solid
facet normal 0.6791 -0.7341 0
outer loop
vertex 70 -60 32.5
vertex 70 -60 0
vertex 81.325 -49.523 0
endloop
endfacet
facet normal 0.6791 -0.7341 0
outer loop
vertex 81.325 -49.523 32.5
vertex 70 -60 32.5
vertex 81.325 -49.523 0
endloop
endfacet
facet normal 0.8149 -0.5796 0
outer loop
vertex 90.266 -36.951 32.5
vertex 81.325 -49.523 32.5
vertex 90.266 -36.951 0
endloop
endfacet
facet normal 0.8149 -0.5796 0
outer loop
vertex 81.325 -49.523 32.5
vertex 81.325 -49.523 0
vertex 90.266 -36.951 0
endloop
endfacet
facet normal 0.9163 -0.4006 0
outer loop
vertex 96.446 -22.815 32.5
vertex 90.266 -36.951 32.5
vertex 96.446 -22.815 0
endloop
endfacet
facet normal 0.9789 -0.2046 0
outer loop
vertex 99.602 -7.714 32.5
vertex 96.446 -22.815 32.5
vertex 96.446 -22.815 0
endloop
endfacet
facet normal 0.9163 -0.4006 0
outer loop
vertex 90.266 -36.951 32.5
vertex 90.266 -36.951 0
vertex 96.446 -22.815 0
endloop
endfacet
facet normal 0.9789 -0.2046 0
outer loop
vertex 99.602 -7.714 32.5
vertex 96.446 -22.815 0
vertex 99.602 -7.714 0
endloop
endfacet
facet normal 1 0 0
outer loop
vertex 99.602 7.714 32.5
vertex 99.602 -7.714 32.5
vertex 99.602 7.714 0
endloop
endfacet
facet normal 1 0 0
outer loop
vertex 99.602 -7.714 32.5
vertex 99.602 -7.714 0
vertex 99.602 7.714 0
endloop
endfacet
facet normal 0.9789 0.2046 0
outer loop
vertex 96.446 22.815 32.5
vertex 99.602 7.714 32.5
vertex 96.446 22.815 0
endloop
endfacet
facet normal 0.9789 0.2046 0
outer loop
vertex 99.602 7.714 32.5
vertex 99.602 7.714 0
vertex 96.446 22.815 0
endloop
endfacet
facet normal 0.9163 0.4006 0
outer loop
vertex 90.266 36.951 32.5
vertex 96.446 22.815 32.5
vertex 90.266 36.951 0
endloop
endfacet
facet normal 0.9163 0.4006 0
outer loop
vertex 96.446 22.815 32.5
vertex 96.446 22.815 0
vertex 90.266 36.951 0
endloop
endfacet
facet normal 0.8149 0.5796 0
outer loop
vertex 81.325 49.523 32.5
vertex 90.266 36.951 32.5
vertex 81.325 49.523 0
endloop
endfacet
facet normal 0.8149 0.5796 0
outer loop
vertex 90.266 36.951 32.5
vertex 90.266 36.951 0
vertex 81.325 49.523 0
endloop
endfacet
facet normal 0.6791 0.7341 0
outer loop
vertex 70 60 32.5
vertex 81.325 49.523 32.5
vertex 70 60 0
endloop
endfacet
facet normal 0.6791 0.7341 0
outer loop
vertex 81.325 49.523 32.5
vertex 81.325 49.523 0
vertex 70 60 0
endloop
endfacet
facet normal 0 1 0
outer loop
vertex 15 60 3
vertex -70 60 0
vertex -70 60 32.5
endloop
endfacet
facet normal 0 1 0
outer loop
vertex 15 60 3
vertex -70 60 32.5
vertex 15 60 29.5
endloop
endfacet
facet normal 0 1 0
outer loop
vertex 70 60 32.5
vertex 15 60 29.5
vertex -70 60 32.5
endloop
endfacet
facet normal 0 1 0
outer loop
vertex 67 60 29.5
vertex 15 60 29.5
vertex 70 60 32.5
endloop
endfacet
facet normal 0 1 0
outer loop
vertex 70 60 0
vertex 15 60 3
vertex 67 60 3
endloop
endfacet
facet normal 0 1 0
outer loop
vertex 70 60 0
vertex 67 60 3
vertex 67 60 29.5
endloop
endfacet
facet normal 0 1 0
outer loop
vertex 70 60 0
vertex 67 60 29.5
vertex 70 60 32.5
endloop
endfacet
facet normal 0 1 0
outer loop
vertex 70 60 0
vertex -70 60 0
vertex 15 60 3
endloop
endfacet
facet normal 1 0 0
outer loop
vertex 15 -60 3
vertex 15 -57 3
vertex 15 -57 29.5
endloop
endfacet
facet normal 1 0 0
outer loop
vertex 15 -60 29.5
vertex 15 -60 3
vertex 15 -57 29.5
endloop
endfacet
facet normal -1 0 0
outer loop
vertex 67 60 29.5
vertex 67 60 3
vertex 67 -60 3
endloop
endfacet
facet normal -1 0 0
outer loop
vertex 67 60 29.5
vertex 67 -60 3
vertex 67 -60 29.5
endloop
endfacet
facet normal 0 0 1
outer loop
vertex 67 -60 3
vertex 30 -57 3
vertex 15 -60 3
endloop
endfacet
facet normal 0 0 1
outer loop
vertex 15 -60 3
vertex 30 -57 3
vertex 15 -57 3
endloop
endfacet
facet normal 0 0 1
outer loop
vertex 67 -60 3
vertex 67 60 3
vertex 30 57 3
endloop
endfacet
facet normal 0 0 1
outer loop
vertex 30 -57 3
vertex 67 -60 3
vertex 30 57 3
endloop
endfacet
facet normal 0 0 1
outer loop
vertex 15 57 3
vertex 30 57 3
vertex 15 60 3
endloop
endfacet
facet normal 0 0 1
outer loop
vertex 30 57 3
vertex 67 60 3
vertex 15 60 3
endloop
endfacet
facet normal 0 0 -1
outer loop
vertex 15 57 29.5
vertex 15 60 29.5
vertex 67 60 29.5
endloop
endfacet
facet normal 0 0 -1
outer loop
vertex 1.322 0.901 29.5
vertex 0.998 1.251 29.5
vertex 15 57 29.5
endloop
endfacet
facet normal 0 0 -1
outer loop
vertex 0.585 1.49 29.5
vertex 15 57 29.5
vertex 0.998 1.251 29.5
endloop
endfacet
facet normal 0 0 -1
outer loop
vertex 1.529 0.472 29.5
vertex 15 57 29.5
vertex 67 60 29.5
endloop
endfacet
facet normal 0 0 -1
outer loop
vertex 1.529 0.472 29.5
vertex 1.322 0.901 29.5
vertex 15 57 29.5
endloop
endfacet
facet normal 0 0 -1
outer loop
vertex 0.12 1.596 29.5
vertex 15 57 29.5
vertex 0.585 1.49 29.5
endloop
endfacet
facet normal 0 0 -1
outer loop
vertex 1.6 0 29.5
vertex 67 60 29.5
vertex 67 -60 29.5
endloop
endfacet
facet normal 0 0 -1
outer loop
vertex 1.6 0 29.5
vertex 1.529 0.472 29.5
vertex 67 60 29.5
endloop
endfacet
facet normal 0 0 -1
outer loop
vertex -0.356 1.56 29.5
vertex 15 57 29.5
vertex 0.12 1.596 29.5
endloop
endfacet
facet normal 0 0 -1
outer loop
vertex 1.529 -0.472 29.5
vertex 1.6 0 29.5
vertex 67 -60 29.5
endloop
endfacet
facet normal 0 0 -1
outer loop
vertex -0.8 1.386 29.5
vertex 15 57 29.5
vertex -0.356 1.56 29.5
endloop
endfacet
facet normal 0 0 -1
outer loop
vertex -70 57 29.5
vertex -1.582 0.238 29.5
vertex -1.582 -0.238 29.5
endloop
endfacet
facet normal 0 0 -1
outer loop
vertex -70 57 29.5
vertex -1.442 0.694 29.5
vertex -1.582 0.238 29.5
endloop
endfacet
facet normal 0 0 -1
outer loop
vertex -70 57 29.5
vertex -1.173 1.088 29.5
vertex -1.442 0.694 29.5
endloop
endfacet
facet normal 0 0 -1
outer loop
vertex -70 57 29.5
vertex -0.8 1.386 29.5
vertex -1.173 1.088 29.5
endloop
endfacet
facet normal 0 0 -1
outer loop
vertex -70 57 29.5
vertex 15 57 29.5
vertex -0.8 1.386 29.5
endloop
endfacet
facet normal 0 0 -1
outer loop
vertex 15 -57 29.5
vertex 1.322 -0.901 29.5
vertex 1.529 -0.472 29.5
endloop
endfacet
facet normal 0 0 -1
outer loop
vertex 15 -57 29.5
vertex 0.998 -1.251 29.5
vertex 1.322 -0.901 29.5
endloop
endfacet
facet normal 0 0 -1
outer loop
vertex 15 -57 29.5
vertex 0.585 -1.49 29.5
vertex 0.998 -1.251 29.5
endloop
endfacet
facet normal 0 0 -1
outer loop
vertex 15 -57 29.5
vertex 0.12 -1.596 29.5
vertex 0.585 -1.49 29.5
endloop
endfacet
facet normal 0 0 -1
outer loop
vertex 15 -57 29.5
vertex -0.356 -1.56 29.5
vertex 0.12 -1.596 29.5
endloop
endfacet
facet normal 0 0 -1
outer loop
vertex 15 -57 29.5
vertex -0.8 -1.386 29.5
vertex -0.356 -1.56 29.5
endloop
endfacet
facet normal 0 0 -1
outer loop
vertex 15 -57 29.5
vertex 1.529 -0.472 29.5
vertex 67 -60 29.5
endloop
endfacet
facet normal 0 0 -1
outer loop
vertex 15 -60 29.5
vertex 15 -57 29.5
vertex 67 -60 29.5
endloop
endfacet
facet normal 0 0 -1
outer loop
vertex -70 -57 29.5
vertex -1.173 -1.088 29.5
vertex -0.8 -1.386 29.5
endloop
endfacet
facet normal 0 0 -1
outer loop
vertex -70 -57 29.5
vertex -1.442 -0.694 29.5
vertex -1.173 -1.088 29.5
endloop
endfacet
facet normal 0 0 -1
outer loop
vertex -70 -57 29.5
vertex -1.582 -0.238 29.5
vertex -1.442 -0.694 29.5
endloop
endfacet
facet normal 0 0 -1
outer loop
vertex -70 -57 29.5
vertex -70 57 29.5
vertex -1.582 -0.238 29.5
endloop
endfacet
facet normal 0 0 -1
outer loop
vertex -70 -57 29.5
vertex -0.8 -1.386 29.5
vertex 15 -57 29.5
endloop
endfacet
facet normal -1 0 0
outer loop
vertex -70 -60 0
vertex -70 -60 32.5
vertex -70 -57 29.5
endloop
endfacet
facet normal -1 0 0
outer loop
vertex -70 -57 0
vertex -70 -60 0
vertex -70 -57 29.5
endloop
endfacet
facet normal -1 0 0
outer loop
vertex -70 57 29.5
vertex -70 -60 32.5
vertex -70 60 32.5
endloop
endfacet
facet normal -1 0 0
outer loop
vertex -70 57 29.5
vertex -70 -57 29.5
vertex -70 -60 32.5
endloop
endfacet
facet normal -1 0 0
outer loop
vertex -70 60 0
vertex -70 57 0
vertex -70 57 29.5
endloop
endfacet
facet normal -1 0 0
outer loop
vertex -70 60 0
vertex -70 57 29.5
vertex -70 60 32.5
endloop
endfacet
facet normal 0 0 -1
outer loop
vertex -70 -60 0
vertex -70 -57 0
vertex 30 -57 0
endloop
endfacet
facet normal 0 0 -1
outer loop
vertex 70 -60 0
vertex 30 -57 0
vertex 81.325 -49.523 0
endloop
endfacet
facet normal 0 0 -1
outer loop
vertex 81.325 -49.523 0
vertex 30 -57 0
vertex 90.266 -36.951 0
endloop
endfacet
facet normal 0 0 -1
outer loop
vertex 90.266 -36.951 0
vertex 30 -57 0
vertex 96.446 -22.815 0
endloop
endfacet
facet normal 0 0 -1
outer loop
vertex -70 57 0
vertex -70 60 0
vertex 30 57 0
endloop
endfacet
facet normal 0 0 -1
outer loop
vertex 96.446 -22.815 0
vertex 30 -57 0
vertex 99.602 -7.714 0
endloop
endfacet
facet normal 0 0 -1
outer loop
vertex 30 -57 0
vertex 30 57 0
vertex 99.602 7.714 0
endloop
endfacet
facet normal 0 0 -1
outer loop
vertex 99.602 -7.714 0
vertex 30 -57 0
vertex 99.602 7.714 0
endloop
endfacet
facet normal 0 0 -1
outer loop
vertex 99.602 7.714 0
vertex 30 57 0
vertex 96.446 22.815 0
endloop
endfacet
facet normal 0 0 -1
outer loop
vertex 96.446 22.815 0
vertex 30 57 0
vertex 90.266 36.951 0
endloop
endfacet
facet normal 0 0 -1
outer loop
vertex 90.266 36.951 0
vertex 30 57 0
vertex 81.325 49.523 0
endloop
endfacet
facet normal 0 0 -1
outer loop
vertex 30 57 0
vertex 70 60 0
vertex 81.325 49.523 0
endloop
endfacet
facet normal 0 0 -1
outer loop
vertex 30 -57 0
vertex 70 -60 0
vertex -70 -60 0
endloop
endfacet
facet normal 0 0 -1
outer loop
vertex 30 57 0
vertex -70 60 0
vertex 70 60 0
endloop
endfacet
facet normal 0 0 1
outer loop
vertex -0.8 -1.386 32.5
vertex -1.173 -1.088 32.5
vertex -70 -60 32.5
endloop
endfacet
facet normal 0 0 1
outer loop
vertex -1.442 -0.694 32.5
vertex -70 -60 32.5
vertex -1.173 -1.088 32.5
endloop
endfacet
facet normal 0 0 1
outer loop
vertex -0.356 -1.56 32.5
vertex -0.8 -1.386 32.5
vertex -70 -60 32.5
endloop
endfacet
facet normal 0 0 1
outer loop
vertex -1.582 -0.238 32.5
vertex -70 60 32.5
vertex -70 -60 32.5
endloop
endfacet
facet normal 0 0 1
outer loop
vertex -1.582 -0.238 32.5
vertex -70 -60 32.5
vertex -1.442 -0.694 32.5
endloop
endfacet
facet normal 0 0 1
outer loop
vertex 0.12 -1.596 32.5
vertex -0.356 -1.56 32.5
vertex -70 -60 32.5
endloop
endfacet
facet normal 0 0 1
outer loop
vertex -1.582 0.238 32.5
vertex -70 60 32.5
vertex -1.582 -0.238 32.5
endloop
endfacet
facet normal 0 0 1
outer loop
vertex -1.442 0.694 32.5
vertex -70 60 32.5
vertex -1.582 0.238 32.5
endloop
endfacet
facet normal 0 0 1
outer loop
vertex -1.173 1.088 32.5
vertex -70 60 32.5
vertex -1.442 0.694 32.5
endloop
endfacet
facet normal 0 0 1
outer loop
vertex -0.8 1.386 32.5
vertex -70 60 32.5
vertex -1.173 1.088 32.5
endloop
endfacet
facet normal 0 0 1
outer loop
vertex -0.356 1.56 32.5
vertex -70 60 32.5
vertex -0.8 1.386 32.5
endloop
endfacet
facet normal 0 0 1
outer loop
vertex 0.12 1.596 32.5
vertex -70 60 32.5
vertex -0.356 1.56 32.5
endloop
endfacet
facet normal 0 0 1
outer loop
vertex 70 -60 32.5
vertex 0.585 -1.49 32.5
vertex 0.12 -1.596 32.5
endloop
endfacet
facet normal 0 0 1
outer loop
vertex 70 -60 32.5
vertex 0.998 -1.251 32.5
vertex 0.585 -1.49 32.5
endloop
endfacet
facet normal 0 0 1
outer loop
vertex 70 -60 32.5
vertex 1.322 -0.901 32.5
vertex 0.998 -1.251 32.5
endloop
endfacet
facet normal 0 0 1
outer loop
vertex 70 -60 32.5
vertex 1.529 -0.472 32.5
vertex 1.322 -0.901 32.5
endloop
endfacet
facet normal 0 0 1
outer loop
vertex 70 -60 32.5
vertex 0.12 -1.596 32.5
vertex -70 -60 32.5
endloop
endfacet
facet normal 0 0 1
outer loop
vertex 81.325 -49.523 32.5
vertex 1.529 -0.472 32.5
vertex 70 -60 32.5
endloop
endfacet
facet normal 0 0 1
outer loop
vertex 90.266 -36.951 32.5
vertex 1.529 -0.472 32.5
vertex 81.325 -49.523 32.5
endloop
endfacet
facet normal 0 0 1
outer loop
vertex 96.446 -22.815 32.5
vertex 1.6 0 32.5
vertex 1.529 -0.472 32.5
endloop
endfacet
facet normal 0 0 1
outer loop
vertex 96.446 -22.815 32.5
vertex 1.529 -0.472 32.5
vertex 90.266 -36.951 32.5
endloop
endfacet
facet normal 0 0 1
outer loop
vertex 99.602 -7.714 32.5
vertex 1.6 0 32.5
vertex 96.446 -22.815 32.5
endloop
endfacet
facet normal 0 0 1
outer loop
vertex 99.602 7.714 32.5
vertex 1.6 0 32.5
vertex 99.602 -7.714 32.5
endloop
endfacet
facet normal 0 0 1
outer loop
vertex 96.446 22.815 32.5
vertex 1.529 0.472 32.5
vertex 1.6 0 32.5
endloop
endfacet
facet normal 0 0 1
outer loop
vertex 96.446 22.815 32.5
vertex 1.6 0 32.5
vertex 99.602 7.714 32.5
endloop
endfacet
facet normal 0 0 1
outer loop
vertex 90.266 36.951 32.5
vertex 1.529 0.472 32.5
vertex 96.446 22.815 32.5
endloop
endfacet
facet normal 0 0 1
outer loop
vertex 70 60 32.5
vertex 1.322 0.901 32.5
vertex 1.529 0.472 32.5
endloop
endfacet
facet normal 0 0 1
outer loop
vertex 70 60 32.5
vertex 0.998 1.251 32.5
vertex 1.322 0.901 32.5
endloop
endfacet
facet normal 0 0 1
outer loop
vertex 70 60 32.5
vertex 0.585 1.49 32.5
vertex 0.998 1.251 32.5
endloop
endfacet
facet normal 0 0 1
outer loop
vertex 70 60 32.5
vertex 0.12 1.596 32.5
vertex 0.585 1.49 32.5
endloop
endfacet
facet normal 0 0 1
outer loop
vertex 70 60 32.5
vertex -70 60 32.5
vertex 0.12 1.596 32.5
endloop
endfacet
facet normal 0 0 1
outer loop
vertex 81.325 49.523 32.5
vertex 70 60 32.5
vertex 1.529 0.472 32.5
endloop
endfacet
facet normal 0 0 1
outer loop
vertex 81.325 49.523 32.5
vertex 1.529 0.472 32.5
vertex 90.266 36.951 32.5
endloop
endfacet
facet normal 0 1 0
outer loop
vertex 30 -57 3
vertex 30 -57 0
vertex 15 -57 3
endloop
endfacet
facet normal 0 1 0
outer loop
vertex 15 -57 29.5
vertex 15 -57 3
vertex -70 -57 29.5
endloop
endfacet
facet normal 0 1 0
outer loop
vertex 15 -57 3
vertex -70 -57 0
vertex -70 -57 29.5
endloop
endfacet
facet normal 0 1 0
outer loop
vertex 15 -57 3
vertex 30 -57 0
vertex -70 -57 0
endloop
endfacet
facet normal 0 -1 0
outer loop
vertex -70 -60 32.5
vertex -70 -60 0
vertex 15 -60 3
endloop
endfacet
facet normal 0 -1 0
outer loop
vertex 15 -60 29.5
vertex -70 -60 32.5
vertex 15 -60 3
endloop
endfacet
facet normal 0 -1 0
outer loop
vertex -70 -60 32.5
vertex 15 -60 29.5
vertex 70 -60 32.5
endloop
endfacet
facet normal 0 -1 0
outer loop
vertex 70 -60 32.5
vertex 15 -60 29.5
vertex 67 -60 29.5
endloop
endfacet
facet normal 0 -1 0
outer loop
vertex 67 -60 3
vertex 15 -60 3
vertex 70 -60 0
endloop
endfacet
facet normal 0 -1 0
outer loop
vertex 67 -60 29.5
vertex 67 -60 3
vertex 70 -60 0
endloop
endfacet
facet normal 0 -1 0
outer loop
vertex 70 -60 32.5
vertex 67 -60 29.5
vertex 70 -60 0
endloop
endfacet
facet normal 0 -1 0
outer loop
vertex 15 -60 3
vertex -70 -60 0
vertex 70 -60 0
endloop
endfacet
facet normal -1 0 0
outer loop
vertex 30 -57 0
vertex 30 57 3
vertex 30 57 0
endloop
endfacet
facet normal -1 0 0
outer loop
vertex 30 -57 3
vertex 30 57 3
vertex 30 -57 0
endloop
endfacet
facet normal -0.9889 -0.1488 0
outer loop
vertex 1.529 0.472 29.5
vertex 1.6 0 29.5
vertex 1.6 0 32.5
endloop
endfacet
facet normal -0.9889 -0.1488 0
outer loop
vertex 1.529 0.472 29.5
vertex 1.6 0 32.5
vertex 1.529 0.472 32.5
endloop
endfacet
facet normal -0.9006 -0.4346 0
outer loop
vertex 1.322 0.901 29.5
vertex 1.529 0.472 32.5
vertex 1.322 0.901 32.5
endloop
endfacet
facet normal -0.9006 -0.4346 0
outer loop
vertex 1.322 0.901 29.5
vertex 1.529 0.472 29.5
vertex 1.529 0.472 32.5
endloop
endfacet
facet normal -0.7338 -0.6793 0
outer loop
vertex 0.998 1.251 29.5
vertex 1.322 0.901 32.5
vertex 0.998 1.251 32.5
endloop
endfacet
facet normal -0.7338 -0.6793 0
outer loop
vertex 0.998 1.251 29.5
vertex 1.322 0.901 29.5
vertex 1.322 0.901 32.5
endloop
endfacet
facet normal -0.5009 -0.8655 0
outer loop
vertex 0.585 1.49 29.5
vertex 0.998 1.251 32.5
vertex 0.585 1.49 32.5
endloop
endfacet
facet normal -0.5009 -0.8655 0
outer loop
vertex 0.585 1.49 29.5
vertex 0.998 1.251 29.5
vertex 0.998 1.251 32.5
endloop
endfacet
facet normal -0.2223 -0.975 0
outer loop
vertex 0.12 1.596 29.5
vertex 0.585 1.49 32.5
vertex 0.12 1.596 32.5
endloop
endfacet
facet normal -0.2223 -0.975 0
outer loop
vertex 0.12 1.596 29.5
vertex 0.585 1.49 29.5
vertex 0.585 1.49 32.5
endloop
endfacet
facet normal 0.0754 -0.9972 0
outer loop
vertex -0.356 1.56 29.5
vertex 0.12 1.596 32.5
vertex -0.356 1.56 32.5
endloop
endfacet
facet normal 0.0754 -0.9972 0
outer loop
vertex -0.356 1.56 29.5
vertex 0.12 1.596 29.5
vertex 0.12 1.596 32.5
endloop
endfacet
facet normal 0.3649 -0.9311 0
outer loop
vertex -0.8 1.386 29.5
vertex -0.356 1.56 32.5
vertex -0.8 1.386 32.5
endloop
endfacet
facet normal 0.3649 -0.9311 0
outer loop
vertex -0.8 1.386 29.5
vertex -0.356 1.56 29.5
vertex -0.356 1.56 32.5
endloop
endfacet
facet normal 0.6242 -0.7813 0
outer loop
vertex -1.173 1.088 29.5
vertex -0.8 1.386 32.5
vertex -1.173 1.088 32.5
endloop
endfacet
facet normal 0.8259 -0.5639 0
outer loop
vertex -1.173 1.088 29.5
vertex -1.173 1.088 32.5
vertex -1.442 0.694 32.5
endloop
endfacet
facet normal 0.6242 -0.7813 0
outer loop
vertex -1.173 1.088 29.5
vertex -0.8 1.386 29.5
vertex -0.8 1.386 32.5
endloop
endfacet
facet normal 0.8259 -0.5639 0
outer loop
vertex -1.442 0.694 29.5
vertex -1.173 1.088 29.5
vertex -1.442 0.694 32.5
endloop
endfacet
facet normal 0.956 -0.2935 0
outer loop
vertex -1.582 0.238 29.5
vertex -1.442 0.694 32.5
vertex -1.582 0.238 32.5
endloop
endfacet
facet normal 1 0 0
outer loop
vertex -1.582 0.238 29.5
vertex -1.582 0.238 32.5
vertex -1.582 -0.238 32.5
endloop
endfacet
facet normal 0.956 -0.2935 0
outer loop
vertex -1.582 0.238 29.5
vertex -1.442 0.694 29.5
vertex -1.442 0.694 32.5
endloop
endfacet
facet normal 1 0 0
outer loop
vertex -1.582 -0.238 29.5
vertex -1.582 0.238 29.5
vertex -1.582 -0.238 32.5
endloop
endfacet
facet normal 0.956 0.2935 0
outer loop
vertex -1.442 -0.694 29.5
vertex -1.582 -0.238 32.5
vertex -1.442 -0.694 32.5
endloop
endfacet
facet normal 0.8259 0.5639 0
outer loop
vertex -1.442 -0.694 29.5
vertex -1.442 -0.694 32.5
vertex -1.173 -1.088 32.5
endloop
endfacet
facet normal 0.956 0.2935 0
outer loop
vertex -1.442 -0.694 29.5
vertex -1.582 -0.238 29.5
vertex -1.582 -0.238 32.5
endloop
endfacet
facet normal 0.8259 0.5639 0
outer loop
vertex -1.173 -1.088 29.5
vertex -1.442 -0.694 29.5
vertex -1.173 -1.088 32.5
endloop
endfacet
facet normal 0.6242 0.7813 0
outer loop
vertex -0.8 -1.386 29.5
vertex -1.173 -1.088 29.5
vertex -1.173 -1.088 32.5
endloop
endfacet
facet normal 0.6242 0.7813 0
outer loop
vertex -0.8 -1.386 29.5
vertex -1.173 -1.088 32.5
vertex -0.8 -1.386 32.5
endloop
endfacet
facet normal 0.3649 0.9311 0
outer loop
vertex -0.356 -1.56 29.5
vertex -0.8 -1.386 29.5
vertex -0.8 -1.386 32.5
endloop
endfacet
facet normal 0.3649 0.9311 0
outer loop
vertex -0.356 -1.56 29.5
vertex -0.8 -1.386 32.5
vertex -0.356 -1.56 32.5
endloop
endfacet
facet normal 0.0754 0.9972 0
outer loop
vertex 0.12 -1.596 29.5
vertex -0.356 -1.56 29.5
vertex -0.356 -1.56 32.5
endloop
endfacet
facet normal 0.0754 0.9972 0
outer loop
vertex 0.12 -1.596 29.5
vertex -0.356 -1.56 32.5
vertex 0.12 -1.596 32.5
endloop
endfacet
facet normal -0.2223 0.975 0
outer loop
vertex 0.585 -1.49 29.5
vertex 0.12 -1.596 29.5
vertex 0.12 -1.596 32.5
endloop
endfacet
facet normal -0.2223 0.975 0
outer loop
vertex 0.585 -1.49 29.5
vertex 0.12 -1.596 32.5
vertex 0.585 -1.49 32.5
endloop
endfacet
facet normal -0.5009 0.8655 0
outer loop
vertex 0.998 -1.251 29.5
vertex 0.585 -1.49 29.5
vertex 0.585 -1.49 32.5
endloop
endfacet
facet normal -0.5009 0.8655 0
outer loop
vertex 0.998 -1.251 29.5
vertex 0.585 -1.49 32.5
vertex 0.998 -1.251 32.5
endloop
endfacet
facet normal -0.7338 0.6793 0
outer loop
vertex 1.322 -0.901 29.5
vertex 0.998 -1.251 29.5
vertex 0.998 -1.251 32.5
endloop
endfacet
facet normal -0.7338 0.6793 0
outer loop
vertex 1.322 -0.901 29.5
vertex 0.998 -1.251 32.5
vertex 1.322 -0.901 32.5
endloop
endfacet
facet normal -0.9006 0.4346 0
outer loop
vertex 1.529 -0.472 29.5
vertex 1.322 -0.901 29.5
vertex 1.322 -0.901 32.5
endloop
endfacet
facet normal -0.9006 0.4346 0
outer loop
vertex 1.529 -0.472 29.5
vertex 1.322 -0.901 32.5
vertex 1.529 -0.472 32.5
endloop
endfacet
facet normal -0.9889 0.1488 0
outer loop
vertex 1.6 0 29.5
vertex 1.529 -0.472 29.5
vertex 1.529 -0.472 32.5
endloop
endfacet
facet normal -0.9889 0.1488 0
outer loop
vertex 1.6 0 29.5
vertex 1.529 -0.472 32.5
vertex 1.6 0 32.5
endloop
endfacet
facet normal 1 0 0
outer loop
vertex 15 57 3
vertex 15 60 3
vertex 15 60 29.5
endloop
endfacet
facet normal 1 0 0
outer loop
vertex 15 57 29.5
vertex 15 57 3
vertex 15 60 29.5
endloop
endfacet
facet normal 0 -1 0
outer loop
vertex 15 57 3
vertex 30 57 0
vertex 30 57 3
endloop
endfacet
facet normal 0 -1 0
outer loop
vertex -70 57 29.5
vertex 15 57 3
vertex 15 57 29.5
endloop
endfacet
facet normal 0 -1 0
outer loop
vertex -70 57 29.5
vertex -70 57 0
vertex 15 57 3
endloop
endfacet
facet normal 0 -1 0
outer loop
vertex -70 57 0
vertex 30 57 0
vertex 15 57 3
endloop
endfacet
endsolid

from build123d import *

# Parameters (mm, degrees)
F0_W     = 140
F0_H     = 120
F0_R     = 1.6002
F1_DEPTH = 32.5
F2_W     = 52
F2_H     = 26.5
F3_DEPTH = 120
F4_W     = 114
F4_H     = 29.5
F5_DEPTH = 100


with BuildPart() as f1:
    # F0 (on Top) → F1 (new body)
    with BuildSketch(Plane.XY):
        Rectangle(F0_W, F0_H)
        Circle(F0_R, mode=Mode.SUBTRACT)
        with BuildLine():
            Line((70, 60), (70, -60))
            ThreePointArc((70, -60), (100, 0), (70, 60))
        make_face()
    extrude(amount=F1_DEPTH)

    # F2 (on face) → F3 (cut)
    with BuildSketch(Plane(origin=(0, 60, 0), x_dir=(-1, 0, 0), z_dir=(0, 1, 0))):
        with Locations((-41, 16.25)):
            Rectangle(F2_W, F2_H)
    extrude(amount=-F3_DEPTH, mode=Mode.SUBTRACT)

    # F4 (on face) → F5 (cut)
    with BuildSketch(Plane(origin=(-70, 0, 0), x_dir=(0, -1, 0), z_dir=(-1, 0, 0))):
        with Locations((0, 14.75)):
            Rectangle(F4_W, F4_H)
    extrude(amount=-F5_DEPTH, mode=Mode.SUBTRACT)


solid = f1.part
